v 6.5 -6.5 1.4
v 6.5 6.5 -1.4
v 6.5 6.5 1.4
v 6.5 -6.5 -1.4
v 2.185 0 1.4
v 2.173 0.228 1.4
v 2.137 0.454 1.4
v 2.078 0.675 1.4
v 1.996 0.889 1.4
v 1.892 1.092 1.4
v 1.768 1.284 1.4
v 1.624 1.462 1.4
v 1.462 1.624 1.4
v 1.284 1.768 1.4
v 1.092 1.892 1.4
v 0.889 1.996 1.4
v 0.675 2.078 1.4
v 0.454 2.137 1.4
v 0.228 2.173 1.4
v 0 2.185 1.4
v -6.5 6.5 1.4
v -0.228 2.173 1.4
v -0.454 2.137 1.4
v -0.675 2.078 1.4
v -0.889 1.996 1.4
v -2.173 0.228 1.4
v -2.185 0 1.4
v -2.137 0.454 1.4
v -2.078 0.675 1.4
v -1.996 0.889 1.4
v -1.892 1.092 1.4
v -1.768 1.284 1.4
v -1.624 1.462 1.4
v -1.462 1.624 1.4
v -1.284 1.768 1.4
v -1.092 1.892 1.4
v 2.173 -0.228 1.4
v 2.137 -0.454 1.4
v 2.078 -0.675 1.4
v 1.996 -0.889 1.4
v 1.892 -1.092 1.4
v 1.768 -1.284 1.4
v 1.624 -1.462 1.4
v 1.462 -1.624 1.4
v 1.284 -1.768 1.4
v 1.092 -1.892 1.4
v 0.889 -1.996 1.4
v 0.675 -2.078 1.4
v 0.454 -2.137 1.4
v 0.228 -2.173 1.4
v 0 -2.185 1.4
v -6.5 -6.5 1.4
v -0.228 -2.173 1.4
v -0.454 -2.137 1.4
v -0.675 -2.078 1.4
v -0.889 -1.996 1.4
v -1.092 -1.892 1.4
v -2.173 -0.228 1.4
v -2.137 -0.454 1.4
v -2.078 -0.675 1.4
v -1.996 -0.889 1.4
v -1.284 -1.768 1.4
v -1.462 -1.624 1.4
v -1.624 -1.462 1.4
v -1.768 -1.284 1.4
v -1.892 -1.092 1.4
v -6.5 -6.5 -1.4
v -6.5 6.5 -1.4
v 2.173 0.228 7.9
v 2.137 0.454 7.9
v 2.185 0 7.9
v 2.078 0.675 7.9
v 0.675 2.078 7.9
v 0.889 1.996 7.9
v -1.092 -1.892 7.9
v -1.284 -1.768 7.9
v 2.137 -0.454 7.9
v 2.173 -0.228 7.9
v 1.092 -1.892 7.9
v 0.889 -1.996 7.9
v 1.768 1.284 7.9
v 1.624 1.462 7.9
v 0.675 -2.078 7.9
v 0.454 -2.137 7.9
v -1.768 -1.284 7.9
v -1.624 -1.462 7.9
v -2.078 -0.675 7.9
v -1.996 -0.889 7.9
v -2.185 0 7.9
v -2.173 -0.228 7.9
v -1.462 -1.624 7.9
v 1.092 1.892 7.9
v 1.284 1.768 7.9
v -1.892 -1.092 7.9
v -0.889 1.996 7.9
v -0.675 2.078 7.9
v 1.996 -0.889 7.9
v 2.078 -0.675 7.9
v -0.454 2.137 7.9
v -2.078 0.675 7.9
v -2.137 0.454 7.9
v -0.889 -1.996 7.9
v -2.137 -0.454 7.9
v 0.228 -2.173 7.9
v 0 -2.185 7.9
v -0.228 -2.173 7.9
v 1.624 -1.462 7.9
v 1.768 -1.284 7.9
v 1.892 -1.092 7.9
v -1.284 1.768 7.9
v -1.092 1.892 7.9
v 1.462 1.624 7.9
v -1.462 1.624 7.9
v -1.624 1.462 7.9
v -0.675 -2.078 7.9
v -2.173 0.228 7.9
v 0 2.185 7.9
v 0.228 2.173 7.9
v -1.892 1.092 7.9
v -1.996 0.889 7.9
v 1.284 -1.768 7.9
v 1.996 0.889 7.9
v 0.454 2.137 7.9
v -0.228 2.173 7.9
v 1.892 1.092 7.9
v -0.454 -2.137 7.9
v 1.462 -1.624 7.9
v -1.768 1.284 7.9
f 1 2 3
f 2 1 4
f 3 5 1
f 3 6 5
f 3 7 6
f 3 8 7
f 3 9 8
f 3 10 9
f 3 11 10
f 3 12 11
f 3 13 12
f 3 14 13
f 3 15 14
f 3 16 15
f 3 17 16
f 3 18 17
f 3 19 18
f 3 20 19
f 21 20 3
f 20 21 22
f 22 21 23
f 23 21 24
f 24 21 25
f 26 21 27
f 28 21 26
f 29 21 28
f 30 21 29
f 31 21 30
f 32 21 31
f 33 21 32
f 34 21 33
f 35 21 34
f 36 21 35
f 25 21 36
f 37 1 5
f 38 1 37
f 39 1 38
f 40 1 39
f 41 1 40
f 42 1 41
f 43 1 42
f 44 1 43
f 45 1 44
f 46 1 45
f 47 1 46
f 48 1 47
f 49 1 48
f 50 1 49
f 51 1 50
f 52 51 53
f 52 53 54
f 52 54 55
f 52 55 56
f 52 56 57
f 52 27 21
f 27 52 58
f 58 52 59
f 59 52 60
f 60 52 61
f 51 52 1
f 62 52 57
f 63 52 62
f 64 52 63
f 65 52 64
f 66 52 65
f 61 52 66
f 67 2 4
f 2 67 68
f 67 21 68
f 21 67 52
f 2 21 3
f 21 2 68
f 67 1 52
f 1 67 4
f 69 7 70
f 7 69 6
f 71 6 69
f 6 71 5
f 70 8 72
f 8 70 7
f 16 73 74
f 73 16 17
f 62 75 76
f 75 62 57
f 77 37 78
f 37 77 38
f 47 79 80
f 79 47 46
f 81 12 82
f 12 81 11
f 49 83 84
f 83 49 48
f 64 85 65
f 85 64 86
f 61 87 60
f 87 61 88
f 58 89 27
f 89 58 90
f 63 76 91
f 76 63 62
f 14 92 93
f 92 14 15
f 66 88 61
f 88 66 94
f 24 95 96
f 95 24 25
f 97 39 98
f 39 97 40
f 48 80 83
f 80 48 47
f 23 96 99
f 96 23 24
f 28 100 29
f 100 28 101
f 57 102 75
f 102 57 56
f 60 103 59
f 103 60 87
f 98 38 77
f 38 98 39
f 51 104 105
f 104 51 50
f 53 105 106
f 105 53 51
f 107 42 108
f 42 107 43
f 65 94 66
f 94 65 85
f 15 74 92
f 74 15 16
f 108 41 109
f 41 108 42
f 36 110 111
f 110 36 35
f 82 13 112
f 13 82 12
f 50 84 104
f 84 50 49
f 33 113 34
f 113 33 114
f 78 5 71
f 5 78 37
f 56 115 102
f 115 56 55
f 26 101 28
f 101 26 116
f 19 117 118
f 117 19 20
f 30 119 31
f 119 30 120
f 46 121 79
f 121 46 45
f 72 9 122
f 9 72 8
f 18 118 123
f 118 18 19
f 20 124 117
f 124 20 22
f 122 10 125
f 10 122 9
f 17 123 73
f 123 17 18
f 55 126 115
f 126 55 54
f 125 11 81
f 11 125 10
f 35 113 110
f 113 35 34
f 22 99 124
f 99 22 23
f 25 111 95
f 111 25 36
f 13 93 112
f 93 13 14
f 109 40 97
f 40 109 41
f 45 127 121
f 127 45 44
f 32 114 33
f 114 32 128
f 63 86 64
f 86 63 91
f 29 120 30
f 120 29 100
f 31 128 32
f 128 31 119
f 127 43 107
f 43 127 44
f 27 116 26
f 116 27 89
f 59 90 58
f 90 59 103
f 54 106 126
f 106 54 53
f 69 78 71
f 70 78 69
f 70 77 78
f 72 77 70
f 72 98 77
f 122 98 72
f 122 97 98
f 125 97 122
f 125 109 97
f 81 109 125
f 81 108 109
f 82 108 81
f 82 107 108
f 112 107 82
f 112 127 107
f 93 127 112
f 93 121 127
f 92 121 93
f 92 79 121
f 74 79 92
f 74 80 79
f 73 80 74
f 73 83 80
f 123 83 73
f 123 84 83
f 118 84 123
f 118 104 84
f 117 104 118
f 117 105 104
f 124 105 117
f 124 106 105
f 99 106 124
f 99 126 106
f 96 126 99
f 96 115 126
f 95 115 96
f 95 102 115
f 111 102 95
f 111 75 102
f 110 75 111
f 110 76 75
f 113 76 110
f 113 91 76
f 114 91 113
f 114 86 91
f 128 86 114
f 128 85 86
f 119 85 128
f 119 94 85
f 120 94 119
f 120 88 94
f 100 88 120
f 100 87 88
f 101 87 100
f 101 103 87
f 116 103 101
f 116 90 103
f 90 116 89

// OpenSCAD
$fn=60;

cube([13,13,2+0.8],true);
translate([0,0,7.9/2])
cylinder(7.9,4.37/2,4.37/2,true);
